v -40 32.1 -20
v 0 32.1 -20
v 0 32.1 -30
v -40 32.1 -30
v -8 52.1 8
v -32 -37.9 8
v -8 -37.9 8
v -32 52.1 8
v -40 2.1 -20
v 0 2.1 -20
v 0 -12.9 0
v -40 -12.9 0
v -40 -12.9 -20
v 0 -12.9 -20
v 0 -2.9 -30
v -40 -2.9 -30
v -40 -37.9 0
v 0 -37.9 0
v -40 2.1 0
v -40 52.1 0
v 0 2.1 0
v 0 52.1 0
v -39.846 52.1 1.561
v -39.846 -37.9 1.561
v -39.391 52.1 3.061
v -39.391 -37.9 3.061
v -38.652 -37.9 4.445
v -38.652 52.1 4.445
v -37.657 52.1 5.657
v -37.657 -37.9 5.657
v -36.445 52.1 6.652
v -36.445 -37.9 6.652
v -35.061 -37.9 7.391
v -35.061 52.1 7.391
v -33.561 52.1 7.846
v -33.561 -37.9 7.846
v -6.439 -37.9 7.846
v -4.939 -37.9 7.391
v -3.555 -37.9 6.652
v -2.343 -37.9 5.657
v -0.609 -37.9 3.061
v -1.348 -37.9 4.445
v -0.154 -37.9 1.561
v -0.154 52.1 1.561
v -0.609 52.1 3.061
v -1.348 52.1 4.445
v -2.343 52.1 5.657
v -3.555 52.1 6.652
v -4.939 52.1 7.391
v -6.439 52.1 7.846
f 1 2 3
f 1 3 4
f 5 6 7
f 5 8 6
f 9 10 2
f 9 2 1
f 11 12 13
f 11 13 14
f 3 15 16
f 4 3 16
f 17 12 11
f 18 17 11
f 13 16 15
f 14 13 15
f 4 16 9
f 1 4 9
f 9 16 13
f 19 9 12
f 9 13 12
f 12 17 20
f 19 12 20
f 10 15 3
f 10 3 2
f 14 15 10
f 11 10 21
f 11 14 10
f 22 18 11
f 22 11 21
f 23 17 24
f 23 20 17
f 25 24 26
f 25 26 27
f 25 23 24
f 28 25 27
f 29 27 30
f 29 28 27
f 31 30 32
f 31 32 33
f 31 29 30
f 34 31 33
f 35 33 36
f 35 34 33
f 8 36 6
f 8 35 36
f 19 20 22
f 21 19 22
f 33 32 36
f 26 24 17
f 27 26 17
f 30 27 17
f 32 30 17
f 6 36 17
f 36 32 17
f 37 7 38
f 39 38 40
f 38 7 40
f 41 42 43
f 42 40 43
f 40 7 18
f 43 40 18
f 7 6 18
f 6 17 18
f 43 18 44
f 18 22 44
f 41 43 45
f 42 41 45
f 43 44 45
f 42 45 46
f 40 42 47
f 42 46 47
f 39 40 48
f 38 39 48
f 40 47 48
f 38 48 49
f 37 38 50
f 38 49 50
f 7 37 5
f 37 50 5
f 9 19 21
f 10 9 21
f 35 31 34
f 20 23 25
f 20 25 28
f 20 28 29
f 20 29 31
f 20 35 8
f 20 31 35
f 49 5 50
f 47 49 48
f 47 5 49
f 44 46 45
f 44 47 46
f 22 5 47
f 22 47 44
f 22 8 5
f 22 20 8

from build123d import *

# Parameters (mm, degrees)
F0_W     = 40
F0_H     = 90
F1_DEPTH = 8
F2_W     = 40
F2_H     = 15
F3_DEPTH = 30
F4_W     = 40
F4_H     = 10
F5_DEPTH = 30
F6_R     = 7.99999
F7_SIZE2 = 10
F7_SIZE  = 10


# Not quite as in the source:
# - a fillet or chamfer is up to 0.001 mm smaller than in the source, because OpenCascade refuses the exact size


with BuildPart() as f1:
    # F0 (on Top) → F1 (new body)
    with BuildSketch(Plane.XY):
        with Locations((-20, 7.0996452868)):
            Rectangle(F0_W, F0_H)
    extrude(amount=F1_DEPTH)

    # F2 (on face) → F3 (join)
    with BuildSketch(Plane(origin=(0, 0, 0), x_dir=(1, 0, 0), z_dir=(0, 0, -1))):
        with Locations((-20, 5.4003547132)):
            Rectangle(F2_W, F2_H)
    extrude(amount=F3_DEPTH)

    # F4 (on face) → F5 (join)
    with BuildSketch(Plane(origin=(0, 2.0996452868, 0), x_dir=(-1, 0, 0), z_dir=(0, 1, 0))):
        with Locations((20, -25)):
            Rectangle(F4_W, F4_H)
    extrude(amount=F5_DEPTH)

    # F6 (radius 8 in the source; OpenCascade refuses exactly that, so slightly less here)
    f6_edges = [f1.edges().sort_by_distance(p)[0] for p in [
        (0, 7.099645, 8),
        (-40, 7.099645, 8),
    ]]
    fillet(f6_edges, radius=F6_R)

    # F7
    f7_edges = [f1.edges().sort_by_distance(p)[0] for p in [
        (-20, -12.900355, -30),
    ]]
    chamfer(f7_edges, length=F7_SIZE, length2=F7_SIZE2)


solid = f1.part
